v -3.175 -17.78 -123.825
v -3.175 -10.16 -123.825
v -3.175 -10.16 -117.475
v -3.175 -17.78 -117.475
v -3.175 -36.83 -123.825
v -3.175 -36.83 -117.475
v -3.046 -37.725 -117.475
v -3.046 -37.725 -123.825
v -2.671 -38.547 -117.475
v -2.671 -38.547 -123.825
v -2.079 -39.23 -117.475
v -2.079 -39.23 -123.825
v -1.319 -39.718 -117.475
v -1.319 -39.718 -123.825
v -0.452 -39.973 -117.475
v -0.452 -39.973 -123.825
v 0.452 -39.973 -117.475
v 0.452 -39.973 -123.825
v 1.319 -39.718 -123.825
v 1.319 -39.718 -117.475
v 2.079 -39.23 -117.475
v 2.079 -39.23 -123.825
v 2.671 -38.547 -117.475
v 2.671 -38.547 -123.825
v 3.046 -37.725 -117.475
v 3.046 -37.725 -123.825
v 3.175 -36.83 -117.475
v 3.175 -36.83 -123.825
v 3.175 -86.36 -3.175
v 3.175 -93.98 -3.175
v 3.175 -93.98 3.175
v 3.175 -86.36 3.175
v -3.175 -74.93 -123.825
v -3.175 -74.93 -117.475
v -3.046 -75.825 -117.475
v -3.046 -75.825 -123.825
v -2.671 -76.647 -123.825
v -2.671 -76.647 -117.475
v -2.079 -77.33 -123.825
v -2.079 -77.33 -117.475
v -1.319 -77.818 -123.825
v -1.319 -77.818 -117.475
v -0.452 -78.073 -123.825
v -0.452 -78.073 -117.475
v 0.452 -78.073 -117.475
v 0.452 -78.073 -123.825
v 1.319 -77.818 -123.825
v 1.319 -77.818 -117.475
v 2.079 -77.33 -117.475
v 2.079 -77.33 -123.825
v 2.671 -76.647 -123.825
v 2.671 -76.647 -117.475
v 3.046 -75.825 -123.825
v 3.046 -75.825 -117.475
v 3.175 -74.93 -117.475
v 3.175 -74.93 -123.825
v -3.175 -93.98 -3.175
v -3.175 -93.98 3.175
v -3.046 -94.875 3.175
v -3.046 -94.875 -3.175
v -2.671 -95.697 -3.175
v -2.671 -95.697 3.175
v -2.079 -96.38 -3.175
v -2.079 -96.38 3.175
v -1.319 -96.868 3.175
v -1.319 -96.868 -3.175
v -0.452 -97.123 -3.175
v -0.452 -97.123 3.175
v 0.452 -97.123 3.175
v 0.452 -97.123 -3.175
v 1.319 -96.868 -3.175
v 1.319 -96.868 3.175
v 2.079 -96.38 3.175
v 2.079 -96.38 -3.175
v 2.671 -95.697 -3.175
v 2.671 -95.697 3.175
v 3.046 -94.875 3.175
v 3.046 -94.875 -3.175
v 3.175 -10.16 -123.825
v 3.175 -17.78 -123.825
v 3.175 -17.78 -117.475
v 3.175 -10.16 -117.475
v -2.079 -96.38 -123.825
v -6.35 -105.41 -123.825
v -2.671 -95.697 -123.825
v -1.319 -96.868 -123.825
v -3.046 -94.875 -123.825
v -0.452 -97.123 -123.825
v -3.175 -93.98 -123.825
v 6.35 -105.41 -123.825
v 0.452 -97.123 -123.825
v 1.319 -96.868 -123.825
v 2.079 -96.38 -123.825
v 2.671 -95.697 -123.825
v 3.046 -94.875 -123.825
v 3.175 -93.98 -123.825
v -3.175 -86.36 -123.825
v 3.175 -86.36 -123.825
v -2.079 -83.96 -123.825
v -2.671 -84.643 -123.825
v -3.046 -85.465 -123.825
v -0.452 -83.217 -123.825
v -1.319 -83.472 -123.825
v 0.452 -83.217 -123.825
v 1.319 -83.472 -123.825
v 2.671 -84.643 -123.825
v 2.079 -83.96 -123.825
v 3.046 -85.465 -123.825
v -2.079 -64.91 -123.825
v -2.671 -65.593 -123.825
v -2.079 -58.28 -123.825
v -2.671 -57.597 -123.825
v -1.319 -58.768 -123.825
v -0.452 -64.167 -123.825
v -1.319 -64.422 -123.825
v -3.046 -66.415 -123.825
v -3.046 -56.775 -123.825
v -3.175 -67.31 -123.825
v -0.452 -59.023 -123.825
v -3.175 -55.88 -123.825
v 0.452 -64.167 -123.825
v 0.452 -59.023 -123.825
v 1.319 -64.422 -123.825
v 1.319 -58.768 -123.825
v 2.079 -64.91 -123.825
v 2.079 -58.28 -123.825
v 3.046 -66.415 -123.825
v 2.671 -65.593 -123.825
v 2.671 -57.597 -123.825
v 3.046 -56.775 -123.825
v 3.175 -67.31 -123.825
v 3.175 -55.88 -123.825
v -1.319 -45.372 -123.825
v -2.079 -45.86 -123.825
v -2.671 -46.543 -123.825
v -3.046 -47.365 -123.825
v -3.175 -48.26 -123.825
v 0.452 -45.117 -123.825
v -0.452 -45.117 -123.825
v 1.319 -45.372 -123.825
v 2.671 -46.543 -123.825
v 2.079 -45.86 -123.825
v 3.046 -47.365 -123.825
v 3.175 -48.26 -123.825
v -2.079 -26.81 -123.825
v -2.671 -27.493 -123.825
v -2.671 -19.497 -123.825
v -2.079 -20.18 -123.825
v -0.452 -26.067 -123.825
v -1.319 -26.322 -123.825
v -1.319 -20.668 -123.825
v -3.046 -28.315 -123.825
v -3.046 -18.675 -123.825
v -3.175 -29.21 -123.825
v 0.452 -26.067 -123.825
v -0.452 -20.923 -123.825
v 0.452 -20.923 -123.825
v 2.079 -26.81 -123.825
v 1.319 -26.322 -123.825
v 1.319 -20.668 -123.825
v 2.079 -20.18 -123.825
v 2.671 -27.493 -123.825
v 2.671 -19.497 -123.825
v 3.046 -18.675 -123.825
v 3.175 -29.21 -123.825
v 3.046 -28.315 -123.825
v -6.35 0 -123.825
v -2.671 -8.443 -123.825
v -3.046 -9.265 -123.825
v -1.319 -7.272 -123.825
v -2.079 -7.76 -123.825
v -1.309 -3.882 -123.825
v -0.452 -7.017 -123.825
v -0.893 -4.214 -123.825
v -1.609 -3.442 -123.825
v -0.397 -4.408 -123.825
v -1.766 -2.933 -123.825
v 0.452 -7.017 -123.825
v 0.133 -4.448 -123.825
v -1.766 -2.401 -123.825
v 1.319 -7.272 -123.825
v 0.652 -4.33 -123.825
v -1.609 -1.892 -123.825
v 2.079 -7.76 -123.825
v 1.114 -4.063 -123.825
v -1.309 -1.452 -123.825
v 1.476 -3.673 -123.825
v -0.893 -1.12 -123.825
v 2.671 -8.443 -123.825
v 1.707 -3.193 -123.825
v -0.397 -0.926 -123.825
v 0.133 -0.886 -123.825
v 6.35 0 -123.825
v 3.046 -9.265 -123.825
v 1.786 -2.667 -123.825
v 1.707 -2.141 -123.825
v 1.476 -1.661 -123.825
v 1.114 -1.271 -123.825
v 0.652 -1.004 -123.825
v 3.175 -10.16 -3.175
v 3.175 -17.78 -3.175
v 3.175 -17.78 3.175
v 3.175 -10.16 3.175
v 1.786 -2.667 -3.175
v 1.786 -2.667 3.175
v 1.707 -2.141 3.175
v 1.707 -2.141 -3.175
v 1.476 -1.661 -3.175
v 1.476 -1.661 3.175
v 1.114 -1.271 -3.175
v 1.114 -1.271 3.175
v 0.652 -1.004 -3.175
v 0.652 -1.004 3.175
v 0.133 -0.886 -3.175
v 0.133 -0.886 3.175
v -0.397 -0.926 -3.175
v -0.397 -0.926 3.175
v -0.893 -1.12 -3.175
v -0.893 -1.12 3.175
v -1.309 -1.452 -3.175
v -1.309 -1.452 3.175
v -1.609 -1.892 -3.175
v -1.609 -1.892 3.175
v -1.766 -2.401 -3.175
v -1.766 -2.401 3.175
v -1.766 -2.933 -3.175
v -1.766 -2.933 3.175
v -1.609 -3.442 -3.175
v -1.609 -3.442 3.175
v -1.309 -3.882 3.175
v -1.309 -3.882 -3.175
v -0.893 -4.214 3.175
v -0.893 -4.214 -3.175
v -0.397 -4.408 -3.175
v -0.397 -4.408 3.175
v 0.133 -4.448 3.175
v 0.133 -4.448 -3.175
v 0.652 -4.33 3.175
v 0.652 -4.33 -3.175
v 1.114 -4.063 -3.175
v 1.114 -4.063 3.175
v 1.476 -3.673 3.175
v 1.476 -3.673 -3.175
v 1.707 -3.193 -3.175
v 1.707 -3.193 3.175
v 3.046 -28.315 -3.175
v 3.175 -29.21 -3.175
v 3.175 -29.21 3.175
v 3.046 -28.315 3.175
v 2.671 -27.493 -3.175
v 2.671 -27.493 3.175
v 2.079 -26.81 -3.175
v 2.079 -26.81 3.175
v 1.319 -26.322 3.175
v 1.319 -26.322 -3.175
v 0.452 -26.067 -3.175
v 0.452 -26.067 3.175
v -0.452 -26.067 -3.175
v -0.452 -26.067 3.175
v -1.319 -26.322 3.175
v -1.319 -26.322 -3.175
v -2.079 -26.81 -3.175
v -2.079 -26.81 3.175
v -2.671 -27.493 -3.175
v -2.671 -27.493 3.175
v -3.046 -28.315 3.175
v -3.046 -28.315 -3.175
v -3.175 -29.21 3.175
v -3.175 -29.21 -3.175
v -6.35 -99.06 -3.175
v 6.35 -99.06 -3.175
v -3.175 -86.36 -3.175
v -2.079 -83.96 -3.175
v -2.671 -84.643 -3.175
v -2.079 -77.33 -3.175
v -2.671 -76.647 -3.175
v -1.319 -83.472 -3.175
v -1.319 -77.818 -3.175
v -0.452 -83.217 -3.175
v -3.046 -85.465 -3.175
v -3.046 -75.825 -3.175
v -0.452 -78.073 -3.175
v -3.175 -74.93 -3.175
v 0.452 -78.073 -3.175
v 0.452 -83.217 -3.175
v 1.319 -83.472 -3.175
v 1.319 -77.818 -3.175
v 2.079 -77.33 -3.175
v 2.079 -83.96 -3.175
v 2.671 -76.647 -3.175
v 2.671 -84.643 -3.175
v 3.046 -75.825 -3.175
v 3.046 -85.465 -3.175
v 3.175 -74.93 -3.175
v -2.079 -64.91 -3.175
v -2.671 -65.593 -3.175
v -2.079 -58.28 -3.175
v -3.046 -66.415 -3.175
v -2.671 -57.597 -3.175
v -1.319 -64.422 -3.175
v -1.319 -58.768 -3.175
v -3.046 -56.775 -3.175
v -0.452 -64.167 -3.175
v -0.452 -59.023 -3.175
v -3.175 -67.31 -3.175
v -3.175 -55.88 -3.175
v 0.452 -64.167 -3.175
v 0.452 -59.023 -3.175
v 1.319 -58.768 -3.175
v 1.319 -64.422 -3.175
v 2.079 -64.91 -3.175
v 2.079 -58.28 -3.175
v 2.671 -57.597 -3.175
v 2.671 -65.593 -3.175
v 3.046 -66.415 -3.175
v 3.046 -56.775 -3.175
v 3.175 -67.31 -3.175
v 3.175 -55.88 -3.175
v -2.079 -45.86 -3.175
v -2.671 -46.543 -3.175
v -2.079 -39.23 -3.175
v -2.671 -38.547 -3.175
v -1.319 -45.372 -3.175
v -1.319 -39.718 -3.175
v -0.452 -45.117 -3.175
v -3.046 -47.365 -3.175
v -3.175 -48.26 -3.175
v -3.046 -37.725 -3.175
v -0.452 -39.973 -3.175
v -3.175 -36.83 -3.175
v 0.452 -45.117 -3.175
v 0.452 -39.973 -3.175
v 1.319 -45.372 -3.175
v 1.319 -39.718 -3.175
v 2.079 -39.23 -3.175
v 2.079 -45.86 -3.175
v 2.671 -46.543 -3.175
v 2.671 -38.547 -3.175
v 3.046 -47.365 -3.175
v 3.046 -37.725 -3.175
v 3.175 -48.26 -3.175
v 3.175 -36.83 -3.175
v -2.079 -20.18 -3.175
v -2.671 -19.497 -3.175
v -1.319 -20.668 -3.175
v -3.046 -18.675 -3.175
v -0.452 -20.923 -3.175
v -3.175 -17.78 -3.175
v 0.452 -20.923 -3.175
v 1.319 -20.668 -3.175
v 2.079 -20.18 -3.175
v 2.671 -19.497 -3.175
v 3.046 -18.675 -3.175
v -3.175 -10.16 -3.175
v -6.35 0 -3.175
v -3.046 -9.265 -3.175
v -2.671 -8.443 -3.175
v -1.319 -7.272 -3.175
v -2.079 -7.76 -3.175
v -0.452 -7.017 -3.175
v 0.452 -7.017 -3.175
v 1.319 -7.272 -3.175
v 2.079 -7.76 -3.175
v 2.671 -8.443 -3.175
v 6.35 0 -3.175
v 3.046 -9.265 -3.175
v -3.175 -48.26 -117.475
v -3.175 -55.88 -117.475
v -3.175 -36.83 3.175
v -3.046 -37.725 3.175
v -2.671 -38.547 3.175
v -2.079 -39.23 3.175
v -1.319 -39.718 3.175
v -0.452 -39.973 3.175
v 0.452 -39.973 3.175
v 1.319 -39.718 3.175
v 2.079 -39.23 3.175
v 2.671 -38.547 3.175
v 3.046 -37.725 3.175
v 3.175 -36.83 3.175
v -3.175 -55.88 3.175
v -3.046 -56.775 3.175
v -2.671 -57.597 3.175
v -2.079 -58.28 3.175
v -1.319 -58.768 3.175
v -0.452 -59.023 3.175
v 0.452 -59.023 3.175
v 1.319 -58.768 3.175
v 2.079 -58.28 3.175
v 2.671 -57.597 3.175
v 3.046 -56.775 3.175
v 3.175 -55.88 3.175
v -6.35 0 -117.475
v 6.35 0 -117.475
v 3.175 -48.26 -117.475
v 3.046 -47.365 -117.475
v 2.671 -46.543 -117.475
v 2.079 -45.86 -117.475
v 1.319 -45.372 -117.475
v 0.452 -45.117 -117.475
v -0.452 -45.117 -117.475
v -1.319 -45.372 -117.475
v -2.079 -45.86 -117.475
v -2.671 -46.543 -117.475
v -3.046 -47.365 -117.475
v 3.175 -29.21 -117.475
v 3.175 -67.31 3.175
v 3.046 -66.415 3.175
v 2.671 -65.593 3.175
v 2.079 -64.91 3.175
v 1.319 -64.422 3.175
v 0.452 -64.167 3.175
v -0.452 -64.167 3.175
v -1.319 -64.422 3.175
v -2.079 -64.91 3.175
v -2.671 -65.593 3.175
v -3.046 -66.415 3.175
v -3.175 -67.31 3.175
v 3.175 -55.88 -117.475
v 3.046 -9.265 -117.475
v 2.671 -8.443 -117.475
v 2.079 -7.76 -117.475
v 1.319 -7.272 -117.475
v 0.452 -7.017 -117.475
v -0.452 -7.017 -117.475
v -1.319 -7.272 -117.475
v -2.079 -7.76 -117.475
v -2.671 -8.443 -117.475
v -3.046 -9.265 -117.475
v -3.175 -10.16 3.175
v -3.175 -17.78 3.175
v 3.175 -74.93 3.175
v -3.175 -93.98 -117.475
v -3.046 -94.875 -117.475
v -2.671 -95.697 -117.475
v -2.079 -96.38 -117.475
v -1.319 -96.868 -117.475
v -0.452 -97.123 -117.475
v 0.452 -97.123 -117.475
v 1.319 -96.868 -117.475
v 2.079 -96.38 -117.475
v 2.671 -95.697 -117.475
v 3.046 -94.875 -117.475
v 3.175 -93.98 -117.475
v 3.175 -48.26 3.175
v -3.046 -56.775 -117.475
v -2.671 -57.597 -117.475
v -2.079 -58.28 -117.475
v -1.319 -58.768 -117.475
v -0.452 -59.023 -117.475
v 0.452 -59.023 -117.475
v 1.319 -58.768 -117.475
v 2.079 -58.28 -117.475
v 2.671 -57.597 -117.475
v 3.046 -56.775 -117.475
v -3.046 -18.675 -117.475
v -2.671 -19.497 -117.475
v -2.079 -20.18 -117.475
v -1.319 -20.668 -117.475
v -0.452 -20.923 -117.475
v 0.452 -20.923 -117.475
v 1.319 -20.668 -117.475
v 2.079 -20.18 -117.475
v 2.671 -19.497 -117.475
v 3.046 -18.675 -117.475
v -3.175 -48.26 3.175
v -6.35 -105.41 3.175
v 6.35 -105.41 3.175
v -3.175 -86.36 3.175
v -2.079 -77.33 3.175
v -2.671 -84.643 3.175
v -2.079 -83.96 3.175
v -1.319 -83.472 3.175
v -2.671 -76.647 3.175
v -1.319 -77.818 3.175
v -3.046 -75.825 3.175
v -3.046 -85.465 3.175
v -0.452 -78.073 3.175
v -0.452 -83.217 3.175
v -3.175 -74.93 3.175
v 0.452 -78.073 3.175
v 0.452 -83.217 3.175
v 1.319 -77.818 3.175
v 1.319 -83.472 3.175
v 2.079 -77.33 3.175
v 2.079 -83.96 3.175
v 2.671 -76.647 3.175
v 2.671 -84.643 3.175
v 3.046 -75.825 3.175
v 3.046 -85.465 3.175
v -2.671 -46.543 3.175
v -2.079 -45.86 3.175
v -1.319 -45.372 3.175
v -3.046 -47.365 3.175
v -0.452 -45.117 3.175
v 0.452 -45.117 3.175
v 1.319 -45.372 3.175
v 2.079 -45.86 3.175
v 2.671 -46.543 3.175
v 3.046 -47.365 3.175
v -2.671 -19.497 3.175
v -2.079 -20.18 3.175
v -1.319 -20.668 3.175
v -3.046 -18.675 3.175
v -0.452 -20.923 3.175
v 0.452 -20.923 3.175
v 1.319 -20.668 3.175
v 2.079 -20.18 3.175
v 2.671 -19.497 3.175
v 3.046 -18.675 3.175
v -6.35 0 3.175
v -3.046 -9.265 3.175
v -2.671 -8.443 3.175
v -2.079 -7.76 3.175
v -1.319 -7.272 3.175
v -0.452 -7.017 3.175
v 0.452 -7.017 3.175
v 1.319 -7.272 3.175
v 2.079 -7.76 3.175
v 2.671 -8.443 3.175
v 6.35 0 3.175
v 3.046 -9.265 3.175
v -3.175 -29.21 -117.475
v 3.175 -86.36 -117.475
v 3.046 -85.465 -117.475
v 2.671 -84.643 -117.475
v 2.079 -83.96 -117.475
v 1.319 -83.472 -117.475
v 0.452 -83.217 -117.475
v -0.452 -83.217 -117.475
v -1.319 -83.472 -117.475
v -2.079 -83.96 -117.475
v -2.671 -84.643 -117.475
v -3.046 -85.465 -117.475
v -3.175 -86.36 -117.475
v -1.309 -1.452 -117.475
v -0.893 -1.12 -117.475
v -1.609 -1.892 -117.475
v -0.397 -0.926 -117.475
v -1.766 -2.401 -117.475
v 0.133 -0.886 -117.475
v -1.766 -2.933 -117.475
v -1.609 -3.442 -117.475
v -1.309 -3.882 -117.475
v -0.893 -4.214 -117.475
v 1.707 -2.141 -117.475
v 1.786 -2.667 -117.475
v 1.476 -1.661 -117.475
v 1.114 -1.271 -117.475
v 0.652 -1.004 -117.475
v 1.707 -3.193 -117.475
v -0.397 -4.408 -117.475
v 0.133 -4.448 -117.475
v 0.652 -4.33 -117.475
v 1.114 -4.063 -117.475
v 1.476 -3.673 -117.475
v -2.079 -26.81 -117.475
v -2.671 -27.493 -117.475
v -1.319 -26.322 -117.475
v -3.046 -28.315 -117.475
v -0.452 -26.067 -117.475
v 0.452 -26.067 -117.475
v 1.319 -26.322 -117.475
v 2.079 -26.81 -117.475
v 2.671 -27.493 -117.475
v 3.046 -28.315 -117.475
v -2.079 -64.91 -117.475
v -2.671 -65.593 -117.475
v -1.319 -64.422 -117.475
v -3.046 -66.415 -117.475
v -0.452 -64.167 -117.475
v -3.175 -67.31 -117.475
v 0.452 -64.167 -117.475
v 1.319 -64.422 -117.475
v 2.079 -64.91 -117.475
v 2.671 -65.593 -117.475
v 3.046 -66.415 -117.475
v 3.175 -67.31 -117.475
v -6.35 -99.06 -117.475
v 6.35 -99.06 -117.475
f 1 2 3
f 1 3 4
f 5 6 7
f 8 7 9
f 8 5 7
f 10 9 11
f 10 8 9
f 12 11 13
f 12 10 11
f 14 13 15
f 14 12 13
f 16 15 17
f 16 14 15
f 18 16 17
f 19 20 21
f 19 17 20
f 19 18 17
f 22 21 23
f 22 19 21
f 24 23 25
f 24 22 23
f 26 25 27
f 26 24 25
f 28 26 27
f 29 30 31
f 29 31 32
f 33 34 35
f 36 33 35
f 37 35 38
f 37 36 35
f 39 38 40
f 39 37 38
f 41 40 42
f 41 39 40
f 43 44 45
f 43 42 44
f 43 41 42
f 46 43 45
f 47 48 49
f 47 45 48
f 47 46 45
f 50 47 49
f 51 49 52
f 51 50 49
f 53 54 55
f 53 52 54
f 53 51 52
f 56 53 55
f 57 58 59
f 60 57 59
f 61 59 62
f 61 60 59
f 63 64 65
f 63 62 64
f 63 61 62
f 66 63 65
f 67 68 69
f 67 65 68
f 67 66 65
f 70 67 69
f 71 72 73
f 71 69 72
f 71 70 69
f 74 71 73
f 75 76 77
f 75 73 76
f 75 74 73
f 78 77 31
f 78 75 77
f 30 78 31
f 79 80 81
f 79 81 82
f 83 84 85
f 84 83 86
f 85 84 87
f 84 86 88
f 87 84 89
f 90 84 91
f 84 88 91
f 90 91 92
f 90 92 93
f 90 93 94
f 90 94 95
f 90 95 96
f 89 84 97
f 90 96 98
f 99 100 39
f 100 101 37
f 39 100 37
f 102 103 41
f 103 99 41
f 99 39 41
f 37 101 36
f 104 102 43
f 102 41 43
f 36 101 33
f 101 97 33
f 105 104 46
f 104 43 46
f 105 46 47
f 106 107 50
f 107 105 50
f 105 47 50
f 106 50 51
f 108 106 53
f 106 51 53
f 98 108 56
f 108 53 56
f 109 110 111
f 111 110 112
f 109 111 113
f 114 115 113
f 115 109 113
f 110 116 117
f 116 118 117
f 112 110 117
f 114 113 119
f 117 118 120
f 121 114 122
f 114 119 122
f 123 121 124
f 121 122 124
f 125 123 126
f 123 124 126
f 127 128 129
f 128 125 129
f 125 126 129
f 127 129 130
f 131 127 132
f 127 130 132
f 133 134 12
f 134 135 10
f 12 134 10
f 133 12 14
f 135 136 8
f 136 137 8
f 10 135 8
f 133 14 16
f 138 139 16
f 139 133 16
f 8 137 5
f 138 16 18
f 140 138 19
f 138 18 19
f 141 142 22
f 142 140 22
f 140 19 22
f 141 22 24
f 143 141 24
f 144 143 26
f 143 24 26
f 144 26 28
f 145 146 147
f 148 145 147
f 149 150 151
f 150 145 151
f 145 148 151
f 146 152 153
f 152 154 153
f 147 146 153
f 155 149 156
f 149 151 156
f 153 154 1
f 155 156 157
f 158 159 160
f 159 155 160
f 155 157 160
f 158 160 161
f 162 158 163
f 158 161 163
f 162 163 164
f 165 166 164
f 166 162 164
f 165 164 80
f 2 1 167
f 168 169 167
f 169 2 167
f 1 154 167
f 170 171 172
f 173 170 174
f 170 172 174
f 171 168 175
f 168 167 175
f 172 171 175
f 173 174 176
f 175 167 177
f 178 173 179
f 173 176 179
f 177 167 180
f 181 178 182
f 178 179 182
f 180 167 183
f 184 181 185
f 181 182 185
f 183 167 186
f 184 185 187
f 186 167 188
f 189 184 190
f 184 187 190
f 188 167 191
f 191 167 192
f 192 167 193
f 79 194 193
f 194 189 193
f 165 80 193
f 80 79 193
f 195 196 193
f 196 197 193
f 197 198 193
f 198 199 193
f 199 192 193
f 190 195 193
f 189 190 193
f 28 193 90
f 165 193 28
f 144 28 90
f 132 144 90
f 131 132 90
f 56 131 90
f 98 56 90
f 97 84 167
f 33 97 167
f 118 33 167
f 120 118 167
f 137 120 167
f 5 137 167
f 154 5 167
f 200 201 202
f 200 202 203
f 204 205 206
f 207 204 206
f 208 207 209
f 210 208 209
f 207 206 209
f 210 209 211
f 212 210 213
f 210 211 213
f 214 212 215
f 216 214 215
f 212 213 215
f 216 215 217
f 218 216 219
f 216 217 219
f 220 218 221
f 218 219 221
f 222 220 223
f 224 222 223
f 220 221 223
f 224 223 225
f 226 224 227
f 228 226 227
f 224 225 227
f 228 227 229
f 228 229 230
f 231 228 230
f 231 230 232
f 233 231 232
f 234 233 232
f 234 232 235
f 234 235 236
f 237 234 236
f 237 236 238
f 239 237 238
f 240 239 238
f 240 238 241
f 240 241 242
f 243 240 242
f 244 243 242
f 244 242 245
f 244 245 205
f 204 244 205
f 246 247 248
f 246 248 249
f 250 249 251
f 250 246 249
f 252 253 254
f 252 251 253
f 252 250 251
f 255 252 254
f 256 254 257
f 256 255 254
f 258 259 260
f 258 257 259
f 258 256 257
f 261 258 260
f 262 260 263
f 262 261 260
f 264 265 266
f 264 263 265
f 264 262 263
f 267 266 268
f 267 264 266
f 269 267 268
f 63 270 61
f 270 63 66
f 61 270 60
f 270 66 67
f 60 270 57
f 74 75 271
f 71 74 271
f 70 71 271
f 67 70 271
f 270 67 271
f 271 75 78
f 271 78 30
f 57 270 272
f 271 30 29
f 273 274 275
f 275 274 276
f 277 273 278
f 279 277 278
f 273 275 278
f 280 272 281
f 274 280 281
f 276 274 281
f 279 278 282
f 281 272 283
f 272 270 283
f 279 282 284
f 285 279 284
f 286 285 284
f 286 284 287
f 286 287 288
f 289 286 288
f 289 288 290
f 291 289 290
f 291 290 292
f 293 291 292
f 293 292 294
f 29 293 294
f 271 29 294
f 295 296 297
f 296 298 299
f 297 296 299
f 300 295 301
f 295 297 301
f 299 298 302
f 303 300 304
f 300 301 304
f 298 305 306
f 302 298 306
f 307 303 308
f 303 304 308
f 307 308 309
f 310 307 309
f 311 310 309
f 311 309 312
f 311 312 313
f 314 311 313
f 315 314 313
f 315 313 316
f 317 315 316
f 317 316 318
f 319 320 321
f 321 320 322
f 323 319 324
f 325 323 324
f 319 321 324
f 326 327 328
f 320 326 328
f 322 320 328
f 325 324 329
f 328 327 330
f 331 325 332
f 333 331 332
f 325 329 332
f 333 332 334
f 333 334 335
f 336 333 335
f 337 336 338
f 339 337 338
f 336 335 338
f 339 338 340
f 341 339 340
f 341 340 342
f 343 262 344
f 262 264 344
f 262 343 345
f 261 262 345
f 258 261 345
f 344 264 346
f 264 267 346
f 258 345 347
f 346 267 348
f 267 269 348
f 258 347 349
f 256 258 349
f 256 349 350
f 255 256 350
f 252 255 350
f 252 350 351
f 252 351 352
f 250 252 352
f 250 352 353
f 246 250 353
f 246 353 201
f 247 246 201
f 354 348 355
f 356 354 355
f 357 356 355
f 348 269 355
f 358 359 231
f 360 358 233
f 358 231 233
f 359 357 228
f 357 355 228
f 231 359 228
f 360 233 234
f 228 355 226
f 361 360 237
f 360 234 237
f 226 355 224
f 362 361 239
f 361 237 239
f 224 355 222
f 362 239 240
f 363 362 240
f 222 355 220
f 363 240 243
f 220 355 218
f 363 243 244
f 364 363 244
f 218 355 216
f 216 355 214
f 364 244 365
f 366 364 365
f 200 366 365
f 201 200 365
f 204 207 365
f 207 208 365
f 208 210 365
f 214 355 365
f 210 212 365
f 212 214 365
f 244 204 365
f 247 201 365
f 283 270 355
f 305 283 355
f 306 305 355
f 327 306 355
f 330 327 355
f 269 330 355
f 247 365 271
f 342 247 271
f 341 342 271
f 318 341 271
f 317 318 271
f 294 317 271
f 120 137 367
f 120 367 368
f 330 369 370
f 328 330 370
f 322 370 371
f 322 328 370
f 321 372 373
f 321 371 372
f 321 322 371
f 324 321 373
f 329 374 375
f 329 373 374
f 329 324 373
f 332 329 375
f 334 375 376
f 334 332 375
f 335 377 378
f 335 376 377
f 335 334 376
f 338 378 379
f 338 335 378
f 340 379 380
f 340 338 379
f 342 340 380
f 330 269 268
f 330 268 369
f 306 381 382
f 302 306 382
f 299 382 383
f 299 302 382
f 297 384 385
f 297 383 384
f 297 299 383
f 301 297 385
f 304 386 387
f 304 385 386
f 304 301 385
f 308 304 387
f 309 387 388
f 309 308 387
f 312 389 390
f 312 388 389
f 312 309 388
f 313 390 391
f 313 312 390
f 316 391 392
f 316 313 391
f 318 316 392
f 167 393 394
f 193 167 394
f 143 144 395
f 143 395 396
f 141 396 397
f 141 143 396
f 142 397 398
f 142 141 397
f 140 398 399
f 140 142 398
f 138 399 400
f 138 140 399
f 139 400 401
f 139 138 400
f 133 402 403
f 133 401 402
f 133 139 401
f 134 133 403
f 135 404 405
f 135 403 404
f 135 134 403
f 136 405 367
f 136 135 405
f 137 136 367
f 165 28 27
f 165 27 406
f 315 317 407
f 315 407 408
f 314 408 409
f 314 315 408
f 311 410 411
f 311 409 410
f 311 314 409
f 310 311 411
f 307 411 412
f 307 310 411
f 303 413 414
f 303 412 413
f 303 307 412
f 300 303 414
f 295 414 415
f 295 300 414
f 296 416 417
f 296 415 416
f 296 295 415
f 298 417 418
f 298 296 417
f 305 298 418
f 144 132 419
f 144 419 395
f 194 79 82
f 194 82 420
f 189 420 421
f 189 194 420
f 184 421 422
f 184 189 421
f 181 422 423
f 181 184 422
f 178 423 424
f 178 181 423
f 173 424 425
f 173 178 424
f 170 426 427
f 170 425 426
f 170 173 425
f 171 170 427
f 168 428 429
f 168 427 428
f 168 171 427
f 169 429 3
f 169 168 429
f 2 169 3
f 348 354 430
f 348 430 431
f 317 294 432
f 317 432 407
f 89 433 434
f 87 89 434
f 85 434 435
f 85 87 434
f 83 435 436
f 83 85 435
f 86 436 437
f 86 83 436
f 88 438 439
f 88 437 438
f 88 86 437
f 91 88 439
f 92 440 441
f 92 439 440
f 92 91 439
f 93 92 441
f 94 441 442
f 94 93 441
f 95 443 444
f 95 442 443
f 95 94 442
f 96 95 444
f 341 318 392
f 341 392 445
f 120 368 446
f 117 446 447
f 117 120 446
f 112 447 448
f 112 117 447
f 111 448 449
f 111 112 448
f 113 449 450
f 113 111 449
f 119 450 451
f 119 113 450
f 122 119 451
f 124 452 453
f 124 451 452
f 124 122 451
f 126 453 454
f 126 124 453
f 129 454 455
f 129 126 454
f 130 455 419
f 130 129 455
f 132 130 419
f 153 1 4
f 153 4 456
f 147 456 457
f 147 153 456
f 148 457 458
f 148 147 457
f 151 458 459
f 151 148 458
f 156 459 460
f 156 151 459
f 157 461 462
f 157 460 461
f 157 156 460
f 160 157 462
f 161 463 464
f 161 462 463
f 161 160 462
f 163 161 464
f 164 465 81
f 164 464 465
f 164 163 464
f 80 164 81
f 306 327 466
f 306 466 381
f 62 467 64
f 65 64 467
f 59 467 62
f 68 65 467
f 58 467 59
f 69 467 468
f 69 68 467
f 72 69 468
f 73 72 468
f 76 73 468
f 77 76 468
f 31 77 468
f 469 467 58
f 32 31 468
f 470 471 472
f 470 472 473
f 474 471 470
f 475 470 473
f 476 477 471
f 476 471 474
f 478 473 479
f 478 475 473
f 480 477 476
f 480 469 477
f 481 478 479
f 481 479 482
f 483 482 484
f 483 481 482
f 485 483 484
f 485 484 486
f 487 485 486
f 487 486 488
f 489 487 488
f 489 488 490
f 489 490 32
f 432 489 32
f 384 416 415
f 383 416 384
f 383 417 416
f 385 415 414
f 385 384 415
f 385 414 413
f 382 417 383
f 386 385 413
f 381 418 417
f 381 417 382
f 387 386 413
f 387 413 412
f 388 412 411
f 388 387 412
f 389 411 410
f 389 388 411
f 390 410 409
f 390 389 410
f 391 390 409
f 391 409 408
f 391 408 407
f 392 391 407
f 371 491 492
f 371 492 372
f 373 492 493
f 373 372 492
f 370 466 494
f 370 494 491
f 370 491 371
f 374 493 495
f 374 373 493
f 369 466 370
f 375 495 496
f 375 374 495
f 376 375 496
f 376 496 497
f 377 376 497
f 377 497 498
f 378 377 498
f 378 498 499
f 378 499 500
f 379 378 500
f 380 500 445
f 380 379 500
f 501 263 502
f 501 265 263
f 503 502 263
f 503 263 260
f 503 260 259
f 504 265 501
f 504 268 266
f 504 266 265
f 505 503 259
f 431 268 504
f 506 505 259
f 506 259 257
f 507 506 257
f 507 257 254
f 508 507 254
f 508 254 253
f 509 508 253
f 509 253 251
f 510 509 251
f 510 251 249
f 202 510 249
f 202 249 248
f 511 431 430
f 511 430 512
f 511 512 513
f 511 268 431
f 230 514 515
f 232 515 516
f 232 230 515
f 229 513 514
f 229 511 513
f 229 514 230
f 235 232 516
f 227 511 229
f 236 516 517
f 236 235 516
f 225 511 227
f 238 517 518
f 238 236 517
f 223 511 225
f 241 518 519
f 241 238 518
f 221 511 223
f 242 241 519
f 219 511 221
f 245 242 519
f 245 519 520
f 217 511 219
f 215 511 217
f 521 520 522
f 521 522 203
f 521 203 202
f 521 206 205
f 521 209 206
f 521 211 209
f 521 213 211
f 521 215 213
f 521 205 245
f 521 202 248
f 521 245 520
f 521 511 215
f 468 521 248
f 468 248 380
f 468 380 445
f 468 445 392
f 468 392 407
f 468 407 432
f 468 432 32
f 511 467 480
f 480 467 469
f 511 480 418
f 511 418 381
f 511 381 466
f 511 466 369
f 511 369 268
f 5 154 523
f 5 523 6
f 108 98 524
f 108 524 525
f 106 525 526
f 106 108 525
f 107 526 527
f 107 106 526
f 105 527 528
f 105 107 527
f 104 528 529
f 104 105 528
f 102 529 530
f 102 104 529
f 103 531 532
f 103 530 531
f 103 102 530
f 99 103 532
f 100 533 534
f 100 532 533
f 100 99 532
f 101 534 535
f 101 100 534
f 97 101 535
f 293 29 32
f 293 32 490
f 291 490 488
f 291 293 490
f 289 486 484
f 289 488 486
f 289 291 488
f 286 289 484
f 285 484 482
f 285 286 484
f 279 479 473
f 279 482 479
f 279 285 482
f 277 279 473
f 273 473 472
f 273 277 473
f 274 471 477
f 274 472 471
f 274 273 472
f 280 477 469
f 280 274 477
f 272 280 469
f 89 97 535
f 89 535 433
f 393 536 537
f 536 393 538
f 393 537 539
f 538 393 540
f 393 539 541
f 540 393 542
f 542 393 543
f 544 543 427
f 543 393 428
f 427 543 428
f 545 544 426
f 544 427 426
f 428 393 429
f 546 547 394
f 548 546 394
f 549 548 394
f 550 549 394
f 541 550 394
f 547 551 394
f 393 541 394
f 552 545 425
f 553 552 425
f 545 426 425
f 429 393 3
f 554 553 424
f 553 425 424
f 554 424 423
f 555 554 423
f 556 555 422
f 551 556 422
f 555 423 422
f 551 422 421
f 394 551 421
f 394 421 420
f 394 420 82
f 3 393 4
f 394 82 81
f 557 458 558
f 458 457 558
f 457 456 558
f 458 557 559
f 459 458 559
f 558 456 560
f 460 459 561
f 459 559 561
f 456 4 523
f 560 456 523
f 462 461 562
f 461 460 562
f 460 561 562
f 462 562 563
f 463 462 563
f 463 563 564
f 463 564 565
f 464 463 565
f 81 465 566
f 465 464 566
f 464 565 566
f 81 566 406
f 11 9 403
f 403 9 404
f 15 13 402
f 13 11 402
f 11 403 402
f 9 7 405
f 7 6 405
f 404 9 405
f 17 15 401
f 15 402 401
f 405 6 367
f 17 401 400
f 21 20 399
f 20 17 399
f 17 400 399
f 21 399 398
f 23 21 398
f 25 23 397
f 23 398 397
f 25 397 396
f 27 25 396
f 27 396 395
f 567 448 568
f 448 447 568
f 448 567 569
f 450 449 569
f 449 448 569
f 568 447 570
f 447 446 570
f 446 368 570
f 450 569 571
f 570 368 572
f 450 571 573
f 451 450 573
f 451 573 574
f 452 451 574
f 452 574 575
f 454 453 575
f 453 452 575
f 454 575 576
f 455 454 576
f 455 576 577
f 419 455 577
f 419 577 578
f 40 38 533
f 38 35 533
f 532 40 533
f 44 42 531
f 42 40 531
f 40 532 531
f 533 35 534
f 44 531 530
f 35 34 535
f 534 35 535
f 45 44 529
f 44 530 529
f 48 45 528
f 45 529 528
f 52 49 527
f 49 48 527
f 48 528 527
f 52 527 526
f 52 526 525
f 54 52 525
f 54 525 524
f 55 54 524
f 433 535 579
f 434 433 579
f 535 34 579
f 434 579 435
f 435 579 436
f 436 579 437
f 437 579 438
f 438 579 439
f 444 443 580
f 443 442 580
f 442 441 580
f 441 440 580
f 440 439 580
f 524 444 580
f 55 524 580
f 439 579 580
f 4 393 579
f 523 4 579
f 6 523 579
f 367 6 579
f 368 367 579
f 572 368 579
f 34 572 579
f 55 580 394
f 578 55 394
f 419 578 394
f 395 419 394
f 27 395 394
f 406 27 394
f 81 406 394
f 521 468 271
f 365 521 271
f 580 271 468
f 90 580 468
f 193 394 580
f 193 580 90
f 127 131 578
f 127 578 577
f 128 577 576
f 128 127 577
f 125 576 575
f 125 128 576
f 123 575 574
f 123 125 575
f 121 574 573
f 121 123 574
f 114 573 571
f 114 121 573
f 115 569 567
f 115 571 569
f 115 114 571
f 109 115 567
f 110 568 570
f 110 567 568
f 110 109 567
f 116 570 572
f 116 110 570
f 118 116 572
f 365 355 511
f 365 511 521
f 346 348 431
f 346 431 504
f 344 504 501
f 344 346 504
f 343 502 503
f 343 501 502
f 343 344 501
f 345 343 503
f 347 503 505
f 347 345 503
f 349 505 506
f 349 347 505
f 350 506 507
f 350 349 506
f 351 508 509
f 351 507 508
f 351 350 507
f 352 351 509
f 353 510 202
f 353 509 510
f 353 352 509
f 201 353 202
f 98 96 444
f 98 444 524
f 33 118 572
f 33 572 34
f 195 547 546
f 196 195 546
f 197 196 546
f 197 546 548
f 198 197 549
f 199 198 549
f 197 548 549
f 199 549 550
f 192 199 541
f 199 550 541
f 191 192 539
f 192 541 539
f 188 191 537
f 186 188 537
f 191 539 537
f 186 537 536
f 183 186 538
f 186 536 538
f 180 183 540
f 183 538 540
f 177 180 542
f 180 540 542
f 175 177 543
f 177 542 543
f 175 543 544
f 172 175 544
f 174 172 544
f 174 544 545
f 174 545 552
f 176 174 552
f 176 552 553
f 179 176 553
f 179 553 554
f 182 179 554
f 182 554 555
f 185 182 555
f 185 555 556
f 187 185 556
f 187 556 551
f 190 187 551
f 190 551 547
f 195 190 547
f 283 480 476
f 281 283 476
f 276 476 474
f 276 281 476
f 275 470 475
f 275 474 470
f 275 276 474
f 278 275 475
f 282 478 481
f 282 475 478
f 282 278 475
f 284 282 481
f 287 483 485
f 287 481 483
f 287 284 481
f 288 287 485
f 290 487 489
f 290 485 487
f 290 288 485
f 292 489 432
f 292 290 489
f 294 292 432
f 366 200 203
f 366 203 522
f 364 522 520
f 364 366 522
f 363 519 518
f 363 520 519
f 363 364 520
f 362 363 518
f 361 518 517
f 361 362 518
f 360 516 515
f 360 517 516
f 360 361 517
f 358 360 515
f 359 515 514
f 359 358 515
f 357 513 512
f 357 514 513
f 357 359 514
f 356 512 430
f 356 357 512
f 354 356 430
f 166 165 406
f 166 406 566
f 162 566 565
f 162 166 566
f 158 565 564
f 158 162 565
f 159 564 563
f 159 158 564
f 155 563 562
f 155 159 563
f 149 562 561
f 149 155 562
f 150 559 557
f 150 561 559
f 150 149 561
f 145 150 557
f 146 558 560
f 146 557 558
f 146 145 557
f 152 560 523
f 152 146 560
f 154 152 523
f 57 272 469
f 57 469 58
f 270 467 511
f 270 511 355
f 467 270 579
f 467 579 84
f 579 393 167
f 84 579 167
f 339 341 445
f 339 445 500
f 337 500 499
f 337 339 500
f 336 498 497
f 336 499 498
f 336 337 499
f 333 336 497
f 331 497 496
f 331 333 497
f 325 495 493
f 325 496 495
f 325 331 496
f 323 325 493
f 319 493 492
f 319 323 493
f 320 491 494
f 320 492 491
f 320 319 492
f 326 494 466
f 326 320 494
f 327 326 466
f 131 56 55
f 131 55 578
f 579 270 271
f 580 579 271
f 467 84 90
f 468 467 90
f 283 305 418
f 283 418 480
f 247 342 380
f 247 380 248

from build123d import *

# Parameters (mm, degrees)
SKETCH1_W                       = 12.7
SKETCH1_H                       = 6.35
BOSS_EXTRUDE1_DEPTH             = 105.41
SKETCH2_W                       = 12.7
SKETCH2_H                       = 6.35
BOSS_EXTRUDE2_DEPTH             = 127
SKETCH3_W                       = 12.7
SKETCH3_H                       = 6.35
BOSS_EXTRUDE3_DEPTH             = 105.41
CUT_EXTRUDE1_DEPTH              = 128
LPATTERN1_COUNT                 = 5
LPATTERN1_PITCH                 = 19.05
F_9_64_0_14063_DIAMETER_HOLE1_D = 3.572002


with BuildPart() as part:
    # Sketch1 → Boss-Extrude1 (new body)
    with BuildSketch(Plane(origin=(0, 0, 0), x_dir=(1, 0, 0), z_dir=(0, 1, 0))):
        Rectangle(SKETCH1_W, SKETCH1_H)
    extrude(amount=-BOSS_EXTRUDE1_DEPTH)

    # Sketch2 → Boss-Extrude2 (add)
    with BuildSketch(Plane.XY.offset(3.175)):
        with Locations((0, -102.235)):
            Rectangle(SKETCH2_W, SKETCH2_H)
    extrude(amount=-BOSS_EXTRUDE2_DEPTH)

    # Sketch3 → Boss-Extrude3 (add)
    with BuildSketch(Plane.XZ.offset(105.41)):
        with Locations((0, -120.65)):
            Rectangle(SKETCH3_W, SKETCH3_H)
    extrude(amount=-BOSS_EXTRUDE3_DEPTH)

    # Sketch4 → Cut-Extrude1 (cut, through all)
    with BuildSketch(Plane(origin=(0, 0, -123.825), x_dir=(-1, 0, 0), z_dir=(0, 0, -1))):
        with BuildLine():
            Line((3.175, -10.16), (3.175, -17.78))
            ThreePointArc((3.175, -17.78), (0, -20.955), (-3.175, -17.78))
            Line((-3.175, -17.78), (-3.175, -10.16))
            ThreePointArc((-3.175, -10.16), (0, -6.985), (3.175, -10.16))
        make_face()
    cut_extrude1 = extrude(amount=-CUT_EXTRUDE1_DEPTH, mode=Mode.SUBTRACT)

    # LPattern1: Cut-Extrude1 ×5
    with Locations(*[(0, -i * LPATTERN1_PITCH, 0) for i in range(1, LPATTERN1_COUNT)]):
        add(cut_extrude1, mode=Mode.SUBTRACT)

    # 9/64 (0.14063) Diameter Hole1 (through all)
    with Locations(Plane(origin=(0, 0, -123.825), x_dir=(-1, 0, 0), z_dir=(0, 0, -1))):
        with Locations((0, -2.667)):
            Hole(F_9_64_0_14063_DIAMETER_HOLE1_D / 2)


solid = part.part
